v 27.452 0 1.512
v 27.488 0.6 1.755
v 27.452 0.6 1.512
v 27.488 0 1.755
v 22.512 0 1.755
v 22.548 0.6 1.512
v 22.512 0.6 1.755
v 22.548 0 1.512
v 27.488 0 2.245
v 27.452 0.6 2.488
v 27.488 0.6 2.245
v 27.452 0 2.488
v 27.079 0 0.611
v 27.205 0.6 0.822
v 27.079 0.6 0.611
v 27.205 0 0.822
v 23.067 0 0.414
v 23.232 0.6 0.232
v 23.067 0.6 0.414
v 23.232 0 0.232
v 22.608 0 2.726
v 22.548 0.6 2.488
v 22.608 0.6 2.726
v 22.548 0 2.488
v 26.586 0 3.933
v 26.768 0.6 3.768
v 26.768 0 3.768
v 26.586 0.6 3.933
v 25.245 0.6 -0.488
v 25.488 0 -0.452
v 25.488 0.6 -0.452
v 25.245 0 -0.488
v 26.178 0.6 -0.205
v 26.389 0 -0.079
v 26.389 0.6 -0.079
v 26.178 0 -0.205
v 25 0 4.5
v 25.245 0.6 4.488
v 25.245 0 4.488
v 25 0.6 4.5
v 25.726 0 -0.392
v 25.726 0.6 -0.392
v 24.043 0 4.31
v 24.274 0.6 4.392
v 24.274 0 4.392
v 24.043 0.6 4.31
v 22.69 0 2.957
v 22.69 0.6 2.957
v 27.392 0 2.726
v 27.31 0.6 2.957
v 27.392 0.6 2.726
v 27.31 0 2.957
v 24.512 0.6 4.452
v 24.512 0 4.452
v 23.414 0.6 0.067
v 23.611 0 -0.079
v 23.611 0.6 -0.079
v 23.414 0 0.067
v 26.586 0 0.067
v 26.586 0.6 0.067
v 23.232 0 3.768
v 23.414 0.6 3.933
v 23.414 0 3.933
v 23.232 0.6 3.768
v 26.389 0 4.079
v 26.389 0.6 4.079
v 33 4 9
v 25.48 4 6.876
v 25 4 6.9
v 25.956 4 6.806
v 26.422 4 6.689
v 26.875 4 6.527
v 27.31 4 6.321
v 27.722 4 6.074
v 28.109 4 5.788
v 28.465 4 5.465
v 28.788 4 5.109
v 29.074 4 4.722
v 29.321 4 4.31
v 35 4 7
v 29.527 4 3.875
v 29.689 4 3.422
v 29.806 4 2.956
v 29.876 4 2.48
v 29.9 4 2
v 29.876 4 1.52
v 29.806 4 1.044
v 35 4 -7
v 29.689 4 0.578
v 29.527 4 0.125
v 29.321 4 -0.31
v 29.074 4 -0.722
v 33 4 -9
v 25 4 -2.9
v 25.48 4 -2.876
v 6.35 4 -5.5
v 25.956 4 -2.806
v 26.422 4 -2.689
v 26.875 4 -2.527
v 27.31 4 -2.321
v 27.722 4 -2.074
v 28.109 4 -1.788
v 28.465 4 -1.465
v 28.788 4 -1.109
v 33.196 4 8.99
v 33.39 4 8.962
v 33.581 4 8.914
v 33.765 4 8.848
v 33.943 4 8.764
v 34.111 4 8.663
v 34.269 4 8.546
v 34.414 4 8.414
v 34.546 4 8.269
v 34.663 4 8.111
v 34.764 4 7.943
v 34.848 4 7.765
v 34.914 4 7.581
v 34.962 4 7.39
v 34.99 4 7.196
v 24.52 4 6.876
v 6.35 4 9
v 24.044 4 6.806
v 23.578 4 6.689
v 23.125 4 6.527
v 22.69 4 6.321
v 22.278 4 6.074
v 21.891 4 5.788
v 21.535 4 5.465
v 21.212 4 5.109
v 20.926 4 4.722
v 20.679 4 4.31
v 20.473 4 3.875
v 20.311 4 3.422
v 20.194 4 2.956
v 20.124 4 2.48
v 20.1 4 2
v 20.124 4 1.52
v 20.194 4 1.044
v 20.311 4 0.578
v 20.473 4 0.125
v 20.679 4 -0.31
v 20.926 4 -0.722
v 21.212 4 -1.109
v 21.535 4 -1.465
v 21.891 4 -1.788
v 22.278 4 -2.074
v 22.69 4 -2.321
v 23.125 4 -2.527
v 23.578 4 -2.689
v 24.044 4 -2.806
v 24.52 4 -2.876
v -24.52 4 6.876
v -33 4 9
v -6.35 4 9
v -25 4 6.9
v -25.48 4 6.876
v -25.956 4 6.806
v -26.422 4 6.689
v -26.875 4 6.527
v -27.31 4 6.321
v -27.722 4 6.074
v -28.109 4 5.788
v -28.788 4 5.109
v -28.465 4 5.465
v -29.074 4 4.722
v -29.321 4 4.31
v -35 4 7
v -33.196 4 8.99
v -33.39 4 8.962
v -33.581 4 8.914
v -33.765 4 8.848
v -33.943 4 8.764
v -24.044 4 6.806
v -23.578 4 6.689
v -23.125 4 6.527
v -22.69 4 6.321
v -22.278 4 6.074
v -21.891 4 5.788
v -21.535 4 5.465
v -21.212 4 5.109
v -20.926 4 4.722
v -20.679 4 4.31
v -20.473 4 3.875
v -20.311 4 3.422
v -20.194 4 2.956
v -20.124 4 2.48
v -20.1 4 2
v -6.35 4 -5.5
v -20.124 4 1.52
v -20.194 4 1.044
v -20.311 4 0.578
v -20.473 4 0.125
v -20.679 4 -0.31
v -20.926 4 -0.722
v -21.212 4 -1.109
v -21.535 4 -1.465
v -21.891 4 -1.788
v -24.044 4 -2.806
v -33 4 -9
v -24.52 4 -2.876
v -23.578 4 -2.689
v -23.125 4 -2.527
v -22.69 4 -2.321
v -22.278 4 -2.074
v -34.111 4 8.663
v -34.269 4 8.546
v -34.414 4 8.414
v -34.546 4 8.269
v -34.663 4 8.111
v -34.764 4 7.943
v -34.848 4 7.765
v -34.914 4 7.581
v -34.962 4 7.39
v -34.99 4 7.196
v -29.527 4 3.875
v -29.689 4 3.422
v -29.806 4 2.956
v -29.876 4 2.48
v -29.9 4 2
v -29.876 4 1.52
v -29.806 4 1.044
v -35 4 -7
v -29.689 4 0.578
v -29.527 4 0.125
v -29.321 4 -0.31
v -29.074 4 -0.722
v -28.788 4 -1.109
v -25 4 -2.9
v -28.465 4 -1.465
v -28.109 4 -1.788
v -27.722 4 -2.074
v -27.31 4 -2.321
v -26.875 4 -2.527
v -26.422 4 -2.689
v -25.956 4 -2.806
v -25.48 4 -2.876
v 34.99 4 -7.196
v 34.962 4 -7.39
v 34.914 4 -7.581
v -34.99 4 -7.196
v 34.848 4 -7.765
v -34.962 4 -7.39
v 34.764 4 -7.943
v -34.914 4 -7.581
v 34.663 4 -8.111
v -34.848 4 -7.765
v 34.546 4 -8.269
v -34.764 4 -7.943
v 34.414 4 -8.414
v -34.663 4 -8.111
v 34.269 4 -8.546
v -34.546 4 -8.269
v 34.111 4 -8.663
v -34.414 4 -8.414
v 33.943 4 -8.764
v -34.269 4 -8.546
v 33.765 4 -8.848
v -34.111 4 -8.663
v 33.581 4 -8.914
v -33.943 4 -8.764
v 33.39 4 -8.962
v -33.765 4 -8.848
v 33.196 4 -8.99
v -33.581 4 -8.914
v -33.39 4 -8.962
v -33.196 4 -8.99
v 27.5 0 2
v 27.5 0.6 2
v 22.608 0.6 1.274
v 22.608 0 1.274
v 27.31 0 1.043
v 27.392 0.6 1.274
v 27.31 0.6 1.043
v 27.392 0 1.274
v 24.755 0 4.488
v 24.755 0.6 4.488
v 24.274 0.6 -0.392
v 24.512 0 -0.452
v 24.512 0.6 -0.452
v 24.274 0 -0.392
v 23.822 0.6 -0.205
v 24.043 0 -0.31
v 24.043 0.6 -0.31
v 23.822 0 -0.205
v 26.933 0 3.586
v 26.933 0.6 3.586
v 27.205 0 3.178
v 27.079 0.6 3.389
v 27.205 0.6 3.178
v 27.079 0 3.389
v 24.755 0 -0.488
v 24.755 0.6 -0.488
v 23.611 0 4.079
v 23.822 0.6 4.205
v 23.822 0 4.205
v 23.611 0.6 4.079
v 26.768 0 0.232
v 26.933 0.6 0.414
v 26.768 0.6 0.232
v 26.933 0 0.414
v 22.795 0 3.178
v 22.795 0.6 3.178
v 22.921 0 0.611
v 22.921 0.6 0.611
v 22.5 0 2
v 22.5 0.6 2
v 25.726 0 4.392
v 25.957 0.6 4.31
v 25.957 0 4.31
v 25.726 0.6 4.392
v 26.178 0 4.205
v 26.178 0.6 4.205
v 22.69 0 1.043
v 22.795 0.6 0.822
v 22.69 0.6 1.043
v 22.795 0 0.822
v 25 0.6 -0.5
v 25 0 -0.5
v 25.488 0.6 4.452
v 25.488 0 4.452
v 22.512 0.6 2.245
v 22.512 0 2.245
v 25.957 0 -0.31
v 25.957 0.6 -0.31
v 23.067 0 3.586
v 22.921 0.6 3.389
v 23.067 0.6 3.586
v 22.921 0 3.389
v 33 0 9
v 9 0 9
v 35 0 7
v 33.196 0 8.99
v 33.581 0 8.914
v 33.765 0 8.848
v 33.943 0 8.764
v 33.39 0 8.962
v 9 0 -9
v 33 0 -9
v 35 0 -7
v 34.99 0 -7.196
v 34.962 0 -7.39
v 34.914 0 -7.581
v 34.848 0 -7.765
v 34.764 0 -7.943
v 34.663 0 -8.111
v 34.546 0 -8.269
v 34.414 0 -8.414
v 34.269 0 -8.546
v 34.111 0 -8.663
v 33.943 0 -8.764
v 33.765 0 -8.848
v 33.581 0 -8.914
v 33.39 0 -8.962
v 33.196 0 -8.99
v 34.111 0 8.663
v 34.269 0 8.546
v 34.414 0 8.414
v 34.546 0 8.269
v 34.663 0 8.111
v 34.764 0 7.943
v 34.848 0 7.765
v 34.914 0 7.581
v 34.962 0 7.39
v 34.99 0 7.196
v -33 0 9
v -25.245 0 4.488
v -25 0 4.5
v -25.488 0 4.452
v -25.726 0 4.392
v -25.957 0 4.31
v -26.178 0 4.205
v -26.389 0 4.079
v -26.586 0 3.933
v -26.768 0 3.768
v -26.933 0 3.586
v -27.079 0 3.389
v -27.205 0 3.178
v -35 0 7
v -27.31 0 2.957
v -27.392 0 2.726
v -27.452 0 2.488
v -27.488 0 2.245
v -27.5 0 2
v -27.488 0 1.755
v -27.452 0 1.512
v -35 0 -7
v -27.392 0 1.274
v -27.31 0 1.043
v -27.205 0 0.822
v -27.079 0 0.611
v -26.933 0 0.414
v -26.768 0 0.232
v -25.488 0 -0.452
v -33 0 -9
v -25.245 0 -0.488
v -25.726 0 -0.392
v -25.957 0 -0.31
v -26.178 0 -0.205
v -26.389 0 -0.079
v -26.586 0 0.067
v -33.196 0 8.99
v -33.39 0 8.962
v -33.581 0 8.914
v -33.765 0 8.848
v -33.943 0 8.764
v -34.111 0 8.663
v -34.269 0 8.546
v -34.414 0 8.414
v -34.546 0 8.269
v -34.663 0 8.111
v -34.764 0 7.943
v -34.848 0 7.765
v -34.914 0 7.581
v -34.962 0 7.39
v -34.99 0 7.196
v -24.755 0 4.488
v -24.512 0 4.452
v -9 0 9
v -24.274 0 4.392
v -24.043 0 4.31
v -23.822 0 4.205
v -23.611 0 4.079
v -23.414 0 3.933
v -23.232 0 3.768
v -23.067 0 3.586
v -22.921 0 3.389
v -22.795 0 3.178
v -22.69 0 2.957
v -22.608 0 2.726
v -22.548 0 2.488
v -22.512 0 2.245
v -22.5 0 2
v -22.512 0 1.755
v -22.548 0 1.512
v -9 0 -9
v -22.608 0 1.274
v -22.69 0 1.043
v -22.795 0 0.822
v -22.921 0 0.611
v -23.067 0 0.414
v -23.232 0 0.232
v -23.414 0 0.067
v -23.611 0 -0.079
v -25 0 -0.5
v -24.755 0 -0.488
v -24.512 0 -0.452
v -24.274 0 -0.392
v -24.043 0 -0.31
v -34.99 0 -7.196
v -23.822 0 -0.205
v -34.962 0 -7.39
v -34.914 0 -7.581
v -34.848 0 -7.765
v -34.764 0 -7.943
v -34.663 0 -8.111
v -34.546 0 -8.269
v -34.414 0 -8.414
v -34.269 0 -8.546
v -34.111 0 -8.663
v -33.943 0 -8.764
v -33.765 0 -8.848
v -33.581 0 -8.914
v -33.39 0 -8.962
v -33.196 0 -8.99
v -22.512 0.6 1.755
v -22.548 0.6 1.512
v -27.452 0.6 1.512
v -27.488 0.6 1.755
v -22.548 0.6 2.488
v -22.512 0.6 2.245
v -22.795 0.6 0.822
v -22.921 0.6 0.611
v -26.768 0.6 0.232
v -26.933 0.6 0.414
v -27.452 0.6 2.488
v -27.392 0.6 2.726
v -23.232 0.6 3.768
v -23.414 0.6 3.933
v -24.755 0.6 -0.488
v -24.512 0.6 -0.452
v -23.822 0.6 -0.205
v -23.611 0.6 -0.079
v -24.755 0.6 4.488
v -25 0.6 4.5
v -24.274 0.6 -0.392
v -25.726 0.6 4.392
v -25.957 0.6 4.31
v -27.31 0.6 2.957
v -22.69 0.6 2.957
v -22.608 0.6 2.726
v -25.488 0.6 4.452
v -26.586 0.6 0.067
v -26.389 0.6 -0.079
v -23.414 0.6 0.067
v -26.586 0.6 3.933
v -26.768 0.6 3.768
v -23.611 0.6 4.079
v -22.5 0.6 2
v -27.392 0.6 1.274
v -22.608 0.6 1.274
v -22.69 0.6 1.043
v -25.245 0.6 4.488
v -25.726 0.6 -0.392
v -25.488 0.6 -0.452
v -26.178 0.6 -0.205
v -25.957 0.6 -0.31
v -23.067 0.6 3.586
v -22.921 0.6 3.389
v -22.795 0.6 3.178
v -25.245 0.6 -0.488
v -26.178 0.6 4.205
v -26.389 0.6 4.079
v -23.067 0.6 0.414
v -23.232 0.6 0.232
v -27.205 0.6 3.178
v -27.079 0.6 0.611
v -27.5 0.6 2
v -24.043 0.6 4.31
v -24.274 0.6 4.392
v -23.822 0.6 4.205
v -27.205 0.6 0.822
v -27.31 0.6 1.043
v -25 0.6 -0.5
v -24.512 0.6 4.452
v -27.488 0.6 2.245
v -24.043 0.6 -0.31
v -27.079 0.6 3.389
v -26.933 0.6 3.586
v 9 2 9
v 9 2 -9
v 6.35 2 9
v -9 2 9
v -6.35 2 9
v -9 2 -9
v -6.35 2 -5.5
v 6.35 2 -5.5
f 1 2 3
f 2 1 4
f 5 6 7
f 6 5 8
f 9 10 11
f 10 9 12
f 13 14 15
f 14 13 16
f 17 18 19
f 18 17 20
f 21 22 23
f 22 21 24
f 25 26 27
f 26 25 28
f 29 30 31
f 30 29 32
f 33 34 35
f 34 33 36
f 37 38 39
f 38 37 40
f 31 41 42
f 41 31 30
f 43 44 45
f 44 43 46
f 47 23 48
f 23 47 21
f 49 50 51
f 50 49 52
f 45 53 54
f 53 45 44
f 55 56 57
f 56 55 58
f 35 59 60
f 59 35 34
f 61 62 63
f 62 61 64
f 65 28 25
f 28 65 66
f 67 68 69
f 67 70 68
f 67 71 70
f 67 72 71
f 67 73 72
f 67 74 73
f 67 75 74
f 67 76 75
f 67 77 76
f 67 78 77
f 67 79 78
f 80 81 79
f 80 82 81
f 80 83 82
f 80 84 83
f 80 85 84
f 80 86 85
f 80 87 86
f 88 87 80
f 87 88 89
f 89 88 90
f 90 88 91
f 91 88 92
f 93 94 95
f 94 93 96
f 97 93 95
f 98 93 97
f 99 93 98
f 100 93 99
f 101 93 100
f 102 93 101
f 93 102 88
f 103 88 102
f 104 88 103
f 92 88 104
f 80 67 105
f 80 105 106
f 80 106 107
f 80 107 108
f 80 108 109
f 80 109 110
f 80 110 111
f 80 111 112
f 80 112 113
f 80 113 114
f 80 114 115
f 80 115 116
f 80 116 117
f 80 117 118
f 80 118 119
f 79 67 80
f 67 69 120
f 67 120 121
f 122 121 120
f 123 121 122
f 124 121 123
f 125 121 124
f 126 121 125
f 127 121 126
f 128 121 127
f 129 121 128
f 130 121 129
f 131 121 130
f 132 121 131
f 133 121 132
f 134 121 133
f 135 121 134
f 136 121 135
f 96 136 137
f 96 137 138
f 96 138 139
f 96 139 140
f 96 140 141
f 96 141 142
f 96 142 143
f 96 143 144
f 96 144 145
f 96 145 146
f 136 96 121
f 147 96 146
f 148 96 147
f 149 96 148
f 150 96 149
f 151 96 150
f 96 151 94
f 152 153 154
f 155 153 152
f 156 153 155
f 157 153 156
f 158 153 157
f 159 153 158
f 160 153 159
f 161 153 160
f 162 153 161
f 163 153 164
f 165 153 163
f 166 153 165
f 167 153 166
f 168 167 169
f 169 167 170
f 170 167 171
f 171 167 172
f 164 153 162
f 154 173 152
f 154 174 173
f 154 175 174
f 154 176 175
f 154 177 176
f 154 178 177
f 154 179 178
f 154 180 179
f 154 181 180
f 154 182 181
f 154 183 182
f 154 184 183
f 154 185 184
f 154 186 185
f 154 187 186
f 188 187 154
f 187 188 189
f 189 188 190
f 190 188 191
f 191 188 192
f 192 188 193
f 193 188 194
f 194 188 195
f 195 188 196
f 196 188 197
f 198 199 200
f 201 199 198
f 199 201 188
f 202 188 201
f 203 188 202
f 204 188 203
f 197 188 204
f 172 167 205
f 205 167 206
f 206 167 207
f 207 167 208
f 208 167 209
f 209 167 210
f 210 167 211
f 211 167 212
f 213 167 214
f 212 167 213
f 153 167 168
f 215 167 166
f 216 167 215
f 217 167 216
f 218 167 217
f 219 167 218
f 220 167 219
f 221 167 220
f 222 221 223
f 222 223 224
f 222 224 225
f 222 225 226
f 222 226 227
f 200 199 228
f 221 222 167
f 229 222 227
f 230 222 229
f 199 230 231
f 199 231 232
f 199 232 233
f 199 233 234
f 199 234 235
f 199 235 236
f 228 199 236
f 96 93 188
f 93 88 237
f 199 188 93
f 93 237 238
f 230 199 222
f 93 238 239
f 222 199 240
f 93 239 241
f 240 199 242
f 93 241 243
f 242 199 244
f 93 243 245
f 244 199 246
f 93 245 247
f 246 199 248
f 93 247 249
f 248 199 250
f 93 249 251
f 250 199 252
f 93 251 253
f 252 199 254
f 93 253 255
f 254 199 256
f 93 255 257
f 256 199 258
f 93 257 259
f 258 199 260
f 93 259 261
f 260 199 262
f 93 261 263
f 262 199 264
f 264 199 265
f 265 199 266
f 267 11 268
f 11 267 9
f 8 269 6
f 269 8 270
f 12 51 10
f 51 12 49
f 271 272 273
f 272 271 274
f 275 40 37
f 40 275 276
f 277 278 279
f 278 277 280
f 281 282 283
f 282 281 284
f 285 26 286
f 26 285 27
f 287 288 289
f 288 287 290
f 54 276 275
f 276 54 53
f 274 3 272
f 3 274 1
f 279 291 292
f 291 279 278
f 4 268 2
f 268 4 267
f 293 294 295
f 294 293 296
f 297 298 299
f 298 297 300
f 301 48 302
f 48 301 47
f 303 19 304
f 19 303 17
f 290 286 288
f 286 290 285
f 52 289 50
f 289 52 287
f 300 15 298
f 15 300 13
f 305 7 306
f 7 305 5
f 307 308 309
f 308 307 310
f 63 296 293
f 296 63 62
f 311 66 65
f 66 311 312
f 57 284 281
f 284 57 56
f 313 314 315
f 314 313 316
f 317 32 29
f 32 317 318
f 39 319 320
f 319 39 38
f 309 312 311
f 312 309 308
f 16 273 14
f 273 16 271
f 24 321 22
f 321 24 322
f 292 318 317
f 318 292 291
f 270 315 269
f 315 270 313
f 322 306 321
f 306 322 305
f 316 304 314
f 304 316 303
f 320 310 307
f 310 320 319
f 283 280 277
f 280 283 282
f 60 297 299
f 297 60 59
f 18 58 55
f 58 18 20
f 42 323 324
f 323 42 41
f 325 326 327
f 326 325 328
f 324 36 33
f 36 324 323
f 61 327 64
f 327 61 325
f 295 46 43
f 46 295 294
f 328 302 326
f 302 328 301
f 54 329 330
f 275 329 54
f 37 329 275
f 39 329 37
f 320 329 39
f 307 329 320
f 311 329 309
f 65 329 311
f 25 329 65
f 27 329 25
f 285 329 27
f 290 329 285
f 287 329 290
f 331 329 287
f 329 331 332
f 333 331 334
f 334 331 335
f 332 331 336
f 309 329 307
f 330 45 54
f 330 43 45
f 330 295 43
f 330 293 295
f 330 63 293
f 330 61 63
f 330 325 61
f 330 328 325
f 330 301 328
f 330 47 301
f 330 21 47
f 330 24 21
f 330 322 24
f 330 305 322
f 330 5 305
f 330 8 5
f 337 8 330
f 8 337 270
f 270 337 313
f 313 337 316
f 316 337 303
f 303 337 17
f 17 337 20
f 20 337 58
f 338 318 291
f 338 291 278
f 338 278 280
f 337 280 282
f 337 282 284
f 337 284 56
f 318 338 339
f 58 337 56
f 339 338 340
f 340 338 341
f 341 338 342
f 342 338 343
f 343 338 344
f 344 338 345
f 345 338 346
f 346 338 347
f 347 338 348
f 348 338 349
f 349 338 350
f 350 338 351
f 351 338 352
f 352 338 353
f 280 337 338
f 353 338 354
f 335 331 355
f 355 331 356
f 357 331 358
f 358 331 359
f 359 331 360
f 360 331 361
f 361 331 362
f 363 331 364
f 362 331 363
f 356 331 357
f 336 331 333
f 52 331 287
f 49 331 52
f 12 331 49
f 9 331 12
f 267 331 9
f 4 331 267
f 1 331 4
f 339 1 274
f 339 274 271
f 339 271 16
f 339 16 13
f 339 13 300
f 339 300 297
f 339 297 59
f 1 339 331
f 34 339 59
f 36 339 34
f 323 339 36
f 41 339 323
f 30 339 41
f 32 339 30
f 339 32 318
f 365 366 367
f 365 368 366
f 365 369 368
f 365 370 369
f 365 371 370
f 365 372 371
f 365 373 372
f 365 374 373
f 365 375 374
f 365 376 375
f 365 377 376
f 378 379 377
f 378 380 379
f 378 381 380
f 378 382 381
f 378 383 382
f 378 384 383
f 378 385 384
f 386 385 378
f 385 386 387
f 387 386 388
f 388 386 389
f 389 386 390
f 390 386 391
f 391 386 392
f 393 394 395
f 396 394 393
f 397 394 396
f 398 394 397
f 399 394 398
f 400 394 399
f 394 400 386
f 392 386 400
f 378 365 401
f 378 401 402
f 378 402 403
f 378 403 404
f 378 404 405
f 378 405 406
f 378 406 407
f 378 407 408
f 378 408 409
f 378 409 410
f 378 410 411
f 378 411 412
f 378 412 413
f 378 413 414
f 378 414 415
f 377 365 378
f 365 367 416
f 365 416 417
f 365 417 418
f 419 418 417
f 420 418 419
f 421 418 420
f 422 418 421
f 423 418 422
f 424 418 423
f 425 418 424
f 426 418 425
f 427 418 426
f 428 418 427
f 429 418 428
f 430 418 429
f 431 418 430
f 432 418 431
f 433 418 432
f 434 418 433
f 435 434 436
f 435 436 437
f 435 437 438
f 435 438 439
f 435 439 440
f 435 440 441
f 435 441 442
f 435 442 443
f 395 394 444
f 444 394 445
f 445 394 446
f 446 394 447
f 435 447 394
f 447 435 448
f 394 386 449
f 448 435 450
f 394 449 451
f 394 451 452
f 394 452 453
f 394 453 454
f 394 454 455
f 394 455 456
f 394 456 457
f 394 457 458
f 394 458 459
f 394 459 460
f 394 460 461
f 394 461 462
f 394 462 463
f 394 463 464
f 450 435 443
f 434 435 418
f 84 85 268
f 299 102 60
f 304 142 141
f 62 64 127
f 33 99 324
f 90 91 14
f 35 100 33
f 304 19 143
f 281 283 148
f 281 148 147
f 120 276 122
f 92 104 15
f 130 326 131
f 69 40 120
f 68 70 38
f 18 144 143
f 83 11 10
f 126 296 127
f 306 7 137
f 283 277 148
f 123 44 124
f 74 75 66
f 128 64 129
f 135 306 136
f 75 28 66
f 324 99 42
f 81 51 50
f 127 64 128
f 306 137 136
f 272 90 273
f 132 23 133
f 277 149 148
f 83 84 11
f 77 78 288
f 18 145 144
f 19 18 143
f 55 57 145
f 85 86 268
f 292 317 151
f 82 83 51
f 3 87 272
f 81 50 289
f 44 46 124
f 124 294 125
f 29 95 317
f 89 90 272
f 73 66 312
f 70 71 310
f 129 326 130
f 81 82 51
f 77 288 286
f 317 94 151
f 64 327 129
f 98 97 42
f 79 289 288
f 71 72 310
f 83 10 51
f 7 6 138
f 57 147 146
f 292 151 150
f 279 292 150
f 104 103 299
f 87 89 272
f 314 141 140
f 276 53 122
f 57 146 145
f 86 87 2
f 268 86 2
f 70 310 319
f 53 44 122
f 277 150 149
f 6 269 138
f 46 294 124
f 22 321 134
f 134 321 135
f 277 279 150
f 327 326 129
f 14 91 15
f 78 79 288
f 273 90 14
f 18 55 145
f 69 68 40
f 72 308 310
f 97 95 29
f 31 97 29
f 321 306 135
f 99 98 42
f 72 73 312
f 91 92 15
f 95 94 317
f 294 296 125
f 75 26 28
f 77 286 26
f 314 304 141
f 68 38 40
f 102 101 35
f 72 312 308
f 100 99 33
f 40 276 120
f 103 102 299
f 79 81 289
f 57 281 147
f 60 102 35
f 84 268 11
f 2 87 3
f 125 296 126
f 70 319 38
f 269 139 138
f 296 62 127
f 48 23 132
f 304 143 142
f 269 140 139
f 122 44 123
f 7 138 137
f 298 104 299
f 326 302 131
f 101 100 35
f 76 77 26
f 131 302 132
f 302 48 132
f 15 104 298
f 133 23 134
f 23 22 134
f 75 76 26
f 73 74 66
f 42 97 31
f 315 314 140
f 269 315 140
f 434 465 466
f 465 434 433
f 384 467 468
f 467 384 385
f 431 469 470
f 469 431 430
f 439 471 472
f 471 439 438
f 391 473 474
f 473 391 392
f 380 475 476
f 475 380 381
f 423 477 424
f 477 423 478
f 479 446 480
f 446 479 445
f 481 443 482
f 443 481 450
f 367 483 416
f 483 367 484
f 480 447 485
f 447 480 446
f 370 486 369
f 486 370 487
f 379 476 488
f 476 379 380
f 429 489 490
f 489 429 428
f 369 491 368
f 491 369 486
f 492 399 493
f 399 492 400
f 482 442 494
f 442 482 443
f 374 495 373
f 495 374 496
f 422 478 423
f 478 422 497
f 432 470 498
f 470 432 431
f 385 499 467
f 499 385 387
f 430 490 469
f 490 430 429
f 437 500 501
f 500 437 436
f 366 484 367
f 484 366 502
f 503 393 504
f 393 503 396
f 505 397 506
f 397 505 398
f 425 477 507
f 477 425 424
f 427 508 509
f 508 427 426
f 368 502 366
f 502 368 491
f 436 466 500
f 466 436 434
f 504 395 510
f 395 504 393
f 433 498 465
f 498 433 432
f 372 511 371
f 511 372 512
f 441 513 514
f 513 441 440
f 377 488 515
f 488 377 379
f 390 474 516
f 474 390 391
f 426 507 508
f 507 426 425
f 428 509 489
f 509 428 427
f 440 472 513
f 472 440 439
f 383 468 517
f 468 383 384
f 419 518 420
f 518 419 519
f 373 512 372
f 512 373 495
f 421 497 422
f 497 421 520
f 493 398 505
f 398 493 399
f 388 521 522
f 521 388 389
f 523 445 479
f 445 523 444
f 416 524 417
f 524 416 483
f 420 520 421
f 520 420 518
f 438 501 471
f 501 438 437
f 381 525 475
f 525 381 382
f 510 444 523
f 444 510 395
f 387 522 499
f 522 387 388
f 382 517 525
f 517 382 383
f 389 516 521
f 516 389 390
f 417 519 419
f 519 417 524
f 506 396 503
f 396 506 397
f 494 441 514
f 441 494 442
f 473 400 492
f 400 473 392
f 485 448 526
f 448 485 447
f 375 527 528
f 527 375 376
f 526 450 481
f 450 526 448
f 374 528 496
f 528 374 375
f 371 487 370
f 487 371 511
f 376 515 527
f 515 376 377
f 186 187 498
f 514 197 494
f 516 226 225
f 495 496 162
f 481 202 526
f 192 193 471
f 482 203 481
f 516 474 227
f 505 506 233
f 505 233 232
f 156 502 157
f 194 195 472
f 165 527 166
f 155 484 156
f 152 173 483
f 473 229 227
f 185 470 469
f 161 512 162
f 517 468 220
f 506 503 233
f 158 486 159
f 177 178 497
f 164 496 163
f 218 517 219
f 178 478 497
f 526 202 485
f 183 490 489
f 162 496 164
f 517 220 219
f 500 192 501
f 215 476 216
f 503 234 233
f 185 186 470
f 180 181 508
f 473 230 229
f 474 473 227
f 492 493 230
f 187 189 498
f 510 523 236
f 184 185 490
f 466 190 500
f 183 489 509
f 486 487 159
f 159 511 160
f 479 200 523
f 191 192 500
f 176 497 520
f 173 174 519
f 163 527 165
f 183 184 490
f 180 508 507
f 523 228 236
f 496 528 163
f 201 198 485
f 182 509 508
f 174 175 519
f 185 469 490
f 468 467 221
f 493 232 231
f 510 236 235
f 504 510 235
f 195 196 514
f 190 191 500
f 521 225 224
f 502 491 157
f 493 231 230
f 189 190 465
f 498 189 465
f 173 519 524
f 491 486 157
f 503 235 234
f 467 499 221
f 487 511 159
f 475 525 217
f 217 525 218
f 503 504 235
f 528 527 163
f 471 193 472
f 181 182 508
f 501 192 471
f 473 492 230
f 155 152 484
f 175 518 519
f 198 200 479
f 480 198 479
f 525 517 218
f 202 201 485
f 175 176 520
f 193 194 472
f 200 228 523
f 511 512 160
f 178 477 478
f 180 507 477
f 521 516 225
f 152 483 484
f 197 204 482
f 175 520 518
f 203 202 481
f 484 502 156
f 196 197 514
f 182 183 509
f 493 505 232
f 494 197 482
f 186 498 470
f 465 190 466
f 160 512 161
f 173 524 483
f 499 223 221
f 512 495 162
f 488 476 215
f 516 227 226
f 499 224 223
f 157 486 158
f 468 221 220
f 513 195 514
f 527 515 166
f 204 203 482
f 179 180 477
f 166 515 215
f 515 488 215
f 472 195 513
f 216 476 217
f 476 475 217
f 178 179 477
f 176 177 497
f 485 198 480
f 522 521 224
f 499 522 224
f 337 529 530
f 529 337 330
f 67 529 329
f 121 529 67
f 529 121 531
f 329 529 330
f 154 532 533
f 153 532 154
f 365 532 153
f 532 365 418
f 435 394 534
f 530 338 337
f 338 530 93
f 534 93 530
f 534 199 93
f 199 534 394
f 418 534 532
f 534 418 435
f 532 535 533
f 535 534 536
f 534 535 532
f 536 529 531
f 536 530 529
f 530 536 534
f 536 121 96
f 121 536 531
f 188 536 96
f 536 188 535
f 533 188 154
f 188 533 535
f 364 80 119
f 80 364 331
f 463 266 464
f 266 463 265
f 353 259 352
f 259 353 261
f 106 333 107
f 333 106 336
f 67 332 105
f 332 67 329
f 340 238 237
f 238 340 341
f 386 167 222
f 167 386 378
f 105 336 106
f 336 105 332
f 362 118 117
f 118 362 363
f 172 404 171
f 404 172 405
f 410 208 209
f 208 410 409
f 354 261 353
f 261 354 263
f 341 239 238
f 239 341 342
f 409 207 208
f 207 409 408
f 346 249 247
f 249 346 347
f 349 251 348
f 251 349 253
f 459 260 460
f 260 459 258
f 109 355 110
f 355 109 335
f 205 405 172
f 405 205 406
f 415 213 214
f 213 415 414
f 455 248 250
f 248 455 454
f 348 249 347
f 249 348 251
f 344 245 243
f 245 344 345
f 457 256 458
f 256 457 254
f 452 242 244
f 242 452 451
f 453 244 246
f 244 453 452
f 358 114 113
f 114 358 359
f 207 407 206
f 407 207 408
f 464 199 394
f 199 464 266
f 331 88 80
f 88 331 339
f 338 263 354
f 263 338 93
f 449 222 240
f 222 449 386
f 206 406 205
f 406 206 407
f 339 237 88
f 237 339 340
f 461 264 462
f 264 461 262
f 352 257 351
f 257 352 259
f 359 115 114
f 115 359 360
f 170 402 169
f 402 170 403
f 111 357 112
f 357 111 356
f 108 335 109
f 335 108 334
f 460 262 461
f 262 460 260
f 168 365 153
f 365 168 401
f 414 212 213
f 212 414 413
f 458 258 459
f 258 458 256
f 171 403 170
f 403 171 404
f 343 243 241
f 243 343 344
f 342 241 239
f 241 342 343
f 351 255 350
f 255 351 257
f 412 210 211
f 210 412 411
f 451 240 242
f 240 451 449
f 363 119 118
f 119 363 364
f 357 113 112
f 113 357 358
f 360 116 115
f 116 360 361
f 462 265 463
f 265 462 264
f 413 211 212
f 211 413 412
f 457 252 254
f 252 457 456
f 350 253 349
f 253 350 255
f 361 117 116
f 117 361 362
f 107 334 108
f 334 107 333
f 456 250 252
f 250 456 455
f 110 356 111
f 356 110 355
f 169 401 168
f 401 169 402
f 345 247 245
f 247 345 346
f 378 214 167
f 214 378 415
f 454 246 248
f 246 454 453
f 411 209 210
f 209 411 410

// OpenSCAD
$fn=64;

//height=3;

//difference() {
//  cylinder(h=15, r=5.5);
//  union() {
//    cylinder(h=15, r=3.5);
//    translate([0, -5.5/2, 15/2]) cube([11, 5.5, 15], center=true);
//  }
//}

rotate([0, 0, 0])
difference() {
  rotate([-90, 0, 0]) 
  minkowski() {
    translate([0, 0, 1.5]) cube([66, 14, 3], center=true);
    cylinder(h=1, r=2);
  }
  union() {
//    translate([0, -2.5, 0]) cube([width+4, 6/2+2, 10+4], center=true);
    // Rounded slot.
//    rotate([90, 0, 0]) translate([0, 0, -1]) cube([16.8, 16.8, 2], center=true);
//    rotate([90, 0, 0]) translate([0, 5, -3]) cube([11, 5, 2], center=true);
//    rotate([90, 0, 0]) translate([0, 2, -5]) cylinder(h=3, d=11);

    // Square slot.
    translate([0, 1, 0]) cube([18, 2, 18], center=true);
    translate([0, 1+2, 2]) cube([12.7, 2, 15], center=true);
//    rotate([90, 0, 0]) translate([0, 2, -5]) cylinder(h=3, d=11);

    // Screw holes.
    rotate([90, 0, 0]) translate([25, 2, -4]) union() {
      cylinder(h=4, d=5);
      cylinder(h=3.4, d1=9.8, d2=5);
    }
    rotate([90, 0, 0]) translate([-25, 2, -4]) union() {
      cylinder(h=4, d=5);
      cylinder(h=3.4, d1=9.8, d2=5);
    }
  }
}

//  color([1, 0, 0]) translate([0, -2, 0]) cube([70, 4, 18], center=true);
